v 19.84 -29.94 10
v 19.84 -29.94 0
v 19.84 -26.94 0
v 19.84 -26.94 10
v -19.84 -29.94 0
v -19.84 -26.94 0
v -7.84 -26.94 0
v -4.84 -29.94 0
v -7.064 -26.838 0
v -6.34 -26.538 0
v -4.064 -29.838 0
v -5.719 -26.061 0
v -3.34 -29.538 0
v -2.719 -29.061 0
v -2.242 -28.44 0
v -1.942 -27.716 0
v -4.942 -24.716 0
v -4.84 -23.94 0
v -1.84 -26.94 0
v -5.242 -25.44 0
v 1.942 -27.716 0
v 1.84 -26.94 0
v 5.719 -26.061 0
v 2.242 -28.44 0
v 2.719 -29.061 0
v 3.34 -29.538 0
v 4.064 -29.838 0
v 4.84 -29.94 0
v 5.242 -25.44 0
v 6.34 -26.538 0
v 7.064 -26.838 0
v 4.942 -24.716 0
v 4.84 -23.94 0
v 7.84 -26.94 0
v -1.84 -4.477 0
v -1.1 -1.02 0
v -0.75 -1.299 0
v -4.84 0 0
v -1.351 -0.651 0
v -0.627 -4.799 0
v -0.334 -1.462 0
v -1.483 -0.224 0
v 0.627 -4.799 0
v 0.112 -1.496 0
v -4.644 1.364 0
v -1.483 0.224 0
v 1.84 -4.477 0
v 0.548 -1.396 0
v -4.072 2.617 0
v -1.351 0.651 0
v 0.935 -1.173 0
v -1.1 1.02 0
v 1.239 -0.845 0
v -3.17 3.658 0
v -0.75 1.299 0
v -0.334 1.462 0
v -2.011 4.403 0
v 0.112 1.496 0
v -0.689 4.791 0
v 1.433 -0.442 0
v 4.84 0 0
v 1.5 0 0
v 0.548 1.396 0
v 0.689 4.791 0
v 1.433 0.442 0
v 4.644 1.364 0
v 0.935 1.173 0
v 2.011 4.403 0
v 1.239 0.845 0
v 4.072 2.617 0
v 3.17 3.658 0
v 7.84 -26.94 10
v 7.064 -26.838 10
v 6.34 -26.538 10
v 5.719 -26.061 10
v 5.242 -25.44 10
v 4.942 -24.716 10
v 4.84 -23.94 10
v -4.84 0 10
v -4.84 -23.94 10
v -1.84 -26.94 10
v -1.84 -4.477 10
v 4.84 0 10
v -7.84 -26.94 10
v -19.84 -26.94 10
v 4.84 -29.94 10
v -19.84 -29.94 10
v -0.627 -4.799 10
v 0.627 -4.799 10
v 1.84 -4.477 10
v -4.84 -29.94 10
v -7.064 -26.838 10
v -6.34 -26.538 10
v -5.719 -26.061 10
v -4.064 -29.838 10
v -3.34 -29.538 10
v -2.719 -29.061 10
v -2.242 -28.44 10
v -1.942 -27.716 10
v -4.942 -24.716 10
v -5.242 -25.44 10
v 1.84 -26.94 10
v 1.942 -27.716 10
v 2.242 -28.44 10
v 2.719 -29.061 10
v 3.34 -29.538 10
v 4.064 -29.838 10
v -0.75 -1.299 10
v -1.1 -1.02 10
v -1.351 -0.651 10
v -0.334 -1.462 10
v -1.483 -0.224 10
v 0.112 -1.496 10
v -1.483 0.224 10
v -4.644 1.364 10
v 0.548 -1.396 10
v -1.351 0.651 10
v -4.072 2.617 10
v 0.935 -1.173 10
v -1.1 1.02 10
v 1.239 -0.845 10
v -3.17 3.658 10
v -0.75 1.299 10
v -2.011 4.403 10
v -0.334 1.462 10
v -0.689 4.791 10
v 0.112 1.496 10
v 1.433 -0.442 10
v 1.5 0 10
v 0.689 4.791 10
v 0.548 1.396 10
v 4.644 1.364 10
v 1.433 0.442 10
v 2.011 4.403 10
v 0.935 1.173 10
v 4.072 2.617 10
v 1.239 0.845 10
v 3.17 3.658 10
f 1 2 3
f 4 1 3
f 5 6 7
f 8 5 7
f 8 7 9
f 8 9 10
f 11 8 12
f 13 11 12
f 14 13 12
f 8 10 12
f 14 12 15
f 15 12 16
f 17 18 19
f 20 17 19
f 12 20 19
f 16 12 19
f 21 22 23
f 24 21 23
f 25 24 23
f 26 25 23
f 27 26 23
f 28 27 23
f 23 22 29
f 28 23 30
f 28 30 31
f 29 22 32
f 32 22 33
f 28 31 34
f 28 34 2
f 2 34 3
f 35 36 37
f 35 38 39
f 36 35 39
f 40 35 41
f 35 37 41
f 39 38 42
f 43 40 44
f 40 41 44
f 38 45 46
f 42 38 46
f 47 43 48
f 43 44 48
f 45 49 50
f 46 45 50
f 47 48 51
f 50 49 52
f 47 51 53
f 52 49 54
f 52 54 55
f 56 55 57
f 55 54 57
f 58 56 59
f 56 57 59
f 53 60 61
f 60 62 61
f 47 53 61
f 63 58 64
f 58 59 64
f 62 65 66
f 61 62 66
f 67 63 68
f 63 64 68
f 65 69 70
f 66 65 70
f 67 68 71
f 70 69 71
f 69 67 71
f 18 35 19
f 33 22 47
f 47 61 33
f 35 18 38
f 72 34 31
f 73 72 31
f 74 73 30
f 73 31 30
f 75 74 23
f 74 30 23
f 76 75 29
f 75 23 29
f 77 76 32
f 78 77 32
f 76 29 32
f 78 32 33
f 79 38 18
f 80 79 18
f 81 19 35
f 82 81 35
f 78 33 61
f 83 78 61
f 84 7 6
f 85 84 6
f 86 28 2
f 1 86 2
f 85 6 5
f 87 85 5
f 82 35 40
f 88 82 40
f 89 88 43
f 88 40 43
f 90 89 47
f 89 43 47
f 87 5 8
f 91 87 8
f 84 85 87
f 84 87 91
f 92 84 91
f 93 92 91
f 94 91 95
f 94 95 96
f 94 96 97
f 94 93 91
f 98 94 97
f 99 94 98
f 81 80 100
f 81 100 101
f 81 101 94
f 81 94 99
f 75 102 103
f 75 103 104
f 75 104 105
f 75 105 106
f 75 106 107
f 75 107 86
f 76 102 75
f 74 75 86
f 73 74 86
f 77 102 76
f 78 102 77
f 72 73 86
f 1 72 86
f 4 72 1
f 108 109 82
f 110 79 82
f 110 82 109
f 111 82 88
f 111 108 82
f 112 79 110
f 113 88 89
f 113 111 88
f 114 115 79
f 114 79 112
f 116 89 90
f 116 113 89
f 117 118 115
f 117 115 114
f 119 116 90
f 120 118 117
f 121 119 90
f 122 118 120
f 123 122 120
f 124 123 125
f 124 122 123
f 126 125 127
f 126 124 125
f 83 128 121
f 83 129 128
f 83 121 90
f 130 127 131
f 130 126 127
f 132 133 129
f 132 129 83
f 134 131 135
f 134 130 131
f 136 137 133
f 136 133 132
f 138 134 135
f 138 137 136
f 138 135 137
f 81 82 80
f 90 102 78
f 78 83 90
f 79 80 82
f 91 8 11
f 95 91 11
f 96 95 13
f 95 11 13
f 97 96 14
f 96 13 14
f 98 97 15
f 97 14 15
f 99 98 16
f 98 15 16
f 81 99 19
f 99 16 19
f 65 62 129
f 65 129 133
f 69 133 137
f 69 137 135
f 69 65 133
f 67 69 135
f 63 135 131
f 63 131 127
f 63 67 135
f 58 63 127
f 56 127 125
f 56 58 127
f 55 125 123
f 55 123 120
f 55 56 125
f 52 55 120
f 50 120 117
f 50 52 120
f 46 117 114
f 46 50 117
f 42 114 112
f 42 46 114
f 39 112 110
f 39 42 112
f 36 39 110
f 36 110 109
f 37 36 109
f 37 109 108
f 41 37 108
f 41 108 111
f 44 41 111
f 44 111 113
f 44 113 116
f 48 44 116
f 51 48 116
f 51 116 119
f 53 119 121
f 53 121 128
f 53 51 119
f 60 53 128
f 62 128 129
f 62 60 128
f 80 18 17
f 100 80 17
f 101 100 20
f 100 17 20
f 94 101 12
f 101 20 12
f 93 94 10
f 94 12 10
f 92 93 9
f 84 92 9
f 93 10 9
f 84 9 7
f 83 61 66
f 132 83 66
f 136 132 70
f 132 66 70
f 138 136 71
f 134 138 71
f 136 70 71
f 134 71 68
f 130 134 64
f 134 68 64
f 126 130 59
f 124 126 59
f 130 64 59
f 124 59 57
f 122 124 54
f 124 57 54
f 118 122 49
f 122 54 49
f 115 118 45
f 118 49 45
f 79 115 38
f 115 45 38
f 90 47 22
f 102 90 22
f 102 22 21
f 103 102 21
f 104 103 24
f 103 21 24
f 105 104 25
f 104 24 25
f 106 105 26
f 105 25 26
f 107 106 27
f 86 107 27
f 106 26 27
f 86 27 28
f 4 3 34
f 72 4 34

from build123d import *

# Parameters (mm, degrees)
SKETCH1_R           = 1.5
BOSS_EXTRUDE1_DEPTH = 10


with BuildPart() as part:
    # Sketch1 → Boss-Extrude1 (new body)
    with BuildSketch(Plane.XY):
        with BuildLine():
            Line((-1.84, -26.94), (-1.84, -4.476605857))
            ThreePointArc((-1.84, -4.476605857), (0, -4.84), (1.84, -4.476605857))
            Line((1.84, -4.476605857), (1.84, -26.94))
            ThreePointArc((1.84, -26.94), (2.718679656, -29.061320344), (4.84, -29.94))
            Line((4.84, -29.94), (19.84, -29.94))
            Line((19.84, -29.94), (19.84, -26.94))
            Line((19.84, -26.94), (7.84, -26.94))
            ThreePointArc((7.84, -26.94), (5.718679656, -26.061320344), (4.84, -23.94))
            Line((4.84, -23.94), (4.84, 0))
            ThreePointArc((4.84, 0), (0, 4.84), (-4.84, 0))
            Line((-4.84, 0), (-4.84, -23.94))
            ThreePointArc((-4.84, -23.94), (-5.718679656, -26.061320344), (-7.84, -26.94))
            Line((-7.84, -26.94), (-19.84, -26.94))
            Line((-19.84, -26.94), (-19.84, -29.94))
            Line((-19.84, -29.94), (-4.84, -29.94))
            ThreePointArc((-4.84, -29.94), (-2.718679656, -29.061320344), (-1.84, -26.94))
        make_face()
        Circle(SKETCH1_R, mode=Mode.SUBTRACT)
    extrude(amount=BOSS_EXTRUDE1_DEPTH)


solid = part.part
